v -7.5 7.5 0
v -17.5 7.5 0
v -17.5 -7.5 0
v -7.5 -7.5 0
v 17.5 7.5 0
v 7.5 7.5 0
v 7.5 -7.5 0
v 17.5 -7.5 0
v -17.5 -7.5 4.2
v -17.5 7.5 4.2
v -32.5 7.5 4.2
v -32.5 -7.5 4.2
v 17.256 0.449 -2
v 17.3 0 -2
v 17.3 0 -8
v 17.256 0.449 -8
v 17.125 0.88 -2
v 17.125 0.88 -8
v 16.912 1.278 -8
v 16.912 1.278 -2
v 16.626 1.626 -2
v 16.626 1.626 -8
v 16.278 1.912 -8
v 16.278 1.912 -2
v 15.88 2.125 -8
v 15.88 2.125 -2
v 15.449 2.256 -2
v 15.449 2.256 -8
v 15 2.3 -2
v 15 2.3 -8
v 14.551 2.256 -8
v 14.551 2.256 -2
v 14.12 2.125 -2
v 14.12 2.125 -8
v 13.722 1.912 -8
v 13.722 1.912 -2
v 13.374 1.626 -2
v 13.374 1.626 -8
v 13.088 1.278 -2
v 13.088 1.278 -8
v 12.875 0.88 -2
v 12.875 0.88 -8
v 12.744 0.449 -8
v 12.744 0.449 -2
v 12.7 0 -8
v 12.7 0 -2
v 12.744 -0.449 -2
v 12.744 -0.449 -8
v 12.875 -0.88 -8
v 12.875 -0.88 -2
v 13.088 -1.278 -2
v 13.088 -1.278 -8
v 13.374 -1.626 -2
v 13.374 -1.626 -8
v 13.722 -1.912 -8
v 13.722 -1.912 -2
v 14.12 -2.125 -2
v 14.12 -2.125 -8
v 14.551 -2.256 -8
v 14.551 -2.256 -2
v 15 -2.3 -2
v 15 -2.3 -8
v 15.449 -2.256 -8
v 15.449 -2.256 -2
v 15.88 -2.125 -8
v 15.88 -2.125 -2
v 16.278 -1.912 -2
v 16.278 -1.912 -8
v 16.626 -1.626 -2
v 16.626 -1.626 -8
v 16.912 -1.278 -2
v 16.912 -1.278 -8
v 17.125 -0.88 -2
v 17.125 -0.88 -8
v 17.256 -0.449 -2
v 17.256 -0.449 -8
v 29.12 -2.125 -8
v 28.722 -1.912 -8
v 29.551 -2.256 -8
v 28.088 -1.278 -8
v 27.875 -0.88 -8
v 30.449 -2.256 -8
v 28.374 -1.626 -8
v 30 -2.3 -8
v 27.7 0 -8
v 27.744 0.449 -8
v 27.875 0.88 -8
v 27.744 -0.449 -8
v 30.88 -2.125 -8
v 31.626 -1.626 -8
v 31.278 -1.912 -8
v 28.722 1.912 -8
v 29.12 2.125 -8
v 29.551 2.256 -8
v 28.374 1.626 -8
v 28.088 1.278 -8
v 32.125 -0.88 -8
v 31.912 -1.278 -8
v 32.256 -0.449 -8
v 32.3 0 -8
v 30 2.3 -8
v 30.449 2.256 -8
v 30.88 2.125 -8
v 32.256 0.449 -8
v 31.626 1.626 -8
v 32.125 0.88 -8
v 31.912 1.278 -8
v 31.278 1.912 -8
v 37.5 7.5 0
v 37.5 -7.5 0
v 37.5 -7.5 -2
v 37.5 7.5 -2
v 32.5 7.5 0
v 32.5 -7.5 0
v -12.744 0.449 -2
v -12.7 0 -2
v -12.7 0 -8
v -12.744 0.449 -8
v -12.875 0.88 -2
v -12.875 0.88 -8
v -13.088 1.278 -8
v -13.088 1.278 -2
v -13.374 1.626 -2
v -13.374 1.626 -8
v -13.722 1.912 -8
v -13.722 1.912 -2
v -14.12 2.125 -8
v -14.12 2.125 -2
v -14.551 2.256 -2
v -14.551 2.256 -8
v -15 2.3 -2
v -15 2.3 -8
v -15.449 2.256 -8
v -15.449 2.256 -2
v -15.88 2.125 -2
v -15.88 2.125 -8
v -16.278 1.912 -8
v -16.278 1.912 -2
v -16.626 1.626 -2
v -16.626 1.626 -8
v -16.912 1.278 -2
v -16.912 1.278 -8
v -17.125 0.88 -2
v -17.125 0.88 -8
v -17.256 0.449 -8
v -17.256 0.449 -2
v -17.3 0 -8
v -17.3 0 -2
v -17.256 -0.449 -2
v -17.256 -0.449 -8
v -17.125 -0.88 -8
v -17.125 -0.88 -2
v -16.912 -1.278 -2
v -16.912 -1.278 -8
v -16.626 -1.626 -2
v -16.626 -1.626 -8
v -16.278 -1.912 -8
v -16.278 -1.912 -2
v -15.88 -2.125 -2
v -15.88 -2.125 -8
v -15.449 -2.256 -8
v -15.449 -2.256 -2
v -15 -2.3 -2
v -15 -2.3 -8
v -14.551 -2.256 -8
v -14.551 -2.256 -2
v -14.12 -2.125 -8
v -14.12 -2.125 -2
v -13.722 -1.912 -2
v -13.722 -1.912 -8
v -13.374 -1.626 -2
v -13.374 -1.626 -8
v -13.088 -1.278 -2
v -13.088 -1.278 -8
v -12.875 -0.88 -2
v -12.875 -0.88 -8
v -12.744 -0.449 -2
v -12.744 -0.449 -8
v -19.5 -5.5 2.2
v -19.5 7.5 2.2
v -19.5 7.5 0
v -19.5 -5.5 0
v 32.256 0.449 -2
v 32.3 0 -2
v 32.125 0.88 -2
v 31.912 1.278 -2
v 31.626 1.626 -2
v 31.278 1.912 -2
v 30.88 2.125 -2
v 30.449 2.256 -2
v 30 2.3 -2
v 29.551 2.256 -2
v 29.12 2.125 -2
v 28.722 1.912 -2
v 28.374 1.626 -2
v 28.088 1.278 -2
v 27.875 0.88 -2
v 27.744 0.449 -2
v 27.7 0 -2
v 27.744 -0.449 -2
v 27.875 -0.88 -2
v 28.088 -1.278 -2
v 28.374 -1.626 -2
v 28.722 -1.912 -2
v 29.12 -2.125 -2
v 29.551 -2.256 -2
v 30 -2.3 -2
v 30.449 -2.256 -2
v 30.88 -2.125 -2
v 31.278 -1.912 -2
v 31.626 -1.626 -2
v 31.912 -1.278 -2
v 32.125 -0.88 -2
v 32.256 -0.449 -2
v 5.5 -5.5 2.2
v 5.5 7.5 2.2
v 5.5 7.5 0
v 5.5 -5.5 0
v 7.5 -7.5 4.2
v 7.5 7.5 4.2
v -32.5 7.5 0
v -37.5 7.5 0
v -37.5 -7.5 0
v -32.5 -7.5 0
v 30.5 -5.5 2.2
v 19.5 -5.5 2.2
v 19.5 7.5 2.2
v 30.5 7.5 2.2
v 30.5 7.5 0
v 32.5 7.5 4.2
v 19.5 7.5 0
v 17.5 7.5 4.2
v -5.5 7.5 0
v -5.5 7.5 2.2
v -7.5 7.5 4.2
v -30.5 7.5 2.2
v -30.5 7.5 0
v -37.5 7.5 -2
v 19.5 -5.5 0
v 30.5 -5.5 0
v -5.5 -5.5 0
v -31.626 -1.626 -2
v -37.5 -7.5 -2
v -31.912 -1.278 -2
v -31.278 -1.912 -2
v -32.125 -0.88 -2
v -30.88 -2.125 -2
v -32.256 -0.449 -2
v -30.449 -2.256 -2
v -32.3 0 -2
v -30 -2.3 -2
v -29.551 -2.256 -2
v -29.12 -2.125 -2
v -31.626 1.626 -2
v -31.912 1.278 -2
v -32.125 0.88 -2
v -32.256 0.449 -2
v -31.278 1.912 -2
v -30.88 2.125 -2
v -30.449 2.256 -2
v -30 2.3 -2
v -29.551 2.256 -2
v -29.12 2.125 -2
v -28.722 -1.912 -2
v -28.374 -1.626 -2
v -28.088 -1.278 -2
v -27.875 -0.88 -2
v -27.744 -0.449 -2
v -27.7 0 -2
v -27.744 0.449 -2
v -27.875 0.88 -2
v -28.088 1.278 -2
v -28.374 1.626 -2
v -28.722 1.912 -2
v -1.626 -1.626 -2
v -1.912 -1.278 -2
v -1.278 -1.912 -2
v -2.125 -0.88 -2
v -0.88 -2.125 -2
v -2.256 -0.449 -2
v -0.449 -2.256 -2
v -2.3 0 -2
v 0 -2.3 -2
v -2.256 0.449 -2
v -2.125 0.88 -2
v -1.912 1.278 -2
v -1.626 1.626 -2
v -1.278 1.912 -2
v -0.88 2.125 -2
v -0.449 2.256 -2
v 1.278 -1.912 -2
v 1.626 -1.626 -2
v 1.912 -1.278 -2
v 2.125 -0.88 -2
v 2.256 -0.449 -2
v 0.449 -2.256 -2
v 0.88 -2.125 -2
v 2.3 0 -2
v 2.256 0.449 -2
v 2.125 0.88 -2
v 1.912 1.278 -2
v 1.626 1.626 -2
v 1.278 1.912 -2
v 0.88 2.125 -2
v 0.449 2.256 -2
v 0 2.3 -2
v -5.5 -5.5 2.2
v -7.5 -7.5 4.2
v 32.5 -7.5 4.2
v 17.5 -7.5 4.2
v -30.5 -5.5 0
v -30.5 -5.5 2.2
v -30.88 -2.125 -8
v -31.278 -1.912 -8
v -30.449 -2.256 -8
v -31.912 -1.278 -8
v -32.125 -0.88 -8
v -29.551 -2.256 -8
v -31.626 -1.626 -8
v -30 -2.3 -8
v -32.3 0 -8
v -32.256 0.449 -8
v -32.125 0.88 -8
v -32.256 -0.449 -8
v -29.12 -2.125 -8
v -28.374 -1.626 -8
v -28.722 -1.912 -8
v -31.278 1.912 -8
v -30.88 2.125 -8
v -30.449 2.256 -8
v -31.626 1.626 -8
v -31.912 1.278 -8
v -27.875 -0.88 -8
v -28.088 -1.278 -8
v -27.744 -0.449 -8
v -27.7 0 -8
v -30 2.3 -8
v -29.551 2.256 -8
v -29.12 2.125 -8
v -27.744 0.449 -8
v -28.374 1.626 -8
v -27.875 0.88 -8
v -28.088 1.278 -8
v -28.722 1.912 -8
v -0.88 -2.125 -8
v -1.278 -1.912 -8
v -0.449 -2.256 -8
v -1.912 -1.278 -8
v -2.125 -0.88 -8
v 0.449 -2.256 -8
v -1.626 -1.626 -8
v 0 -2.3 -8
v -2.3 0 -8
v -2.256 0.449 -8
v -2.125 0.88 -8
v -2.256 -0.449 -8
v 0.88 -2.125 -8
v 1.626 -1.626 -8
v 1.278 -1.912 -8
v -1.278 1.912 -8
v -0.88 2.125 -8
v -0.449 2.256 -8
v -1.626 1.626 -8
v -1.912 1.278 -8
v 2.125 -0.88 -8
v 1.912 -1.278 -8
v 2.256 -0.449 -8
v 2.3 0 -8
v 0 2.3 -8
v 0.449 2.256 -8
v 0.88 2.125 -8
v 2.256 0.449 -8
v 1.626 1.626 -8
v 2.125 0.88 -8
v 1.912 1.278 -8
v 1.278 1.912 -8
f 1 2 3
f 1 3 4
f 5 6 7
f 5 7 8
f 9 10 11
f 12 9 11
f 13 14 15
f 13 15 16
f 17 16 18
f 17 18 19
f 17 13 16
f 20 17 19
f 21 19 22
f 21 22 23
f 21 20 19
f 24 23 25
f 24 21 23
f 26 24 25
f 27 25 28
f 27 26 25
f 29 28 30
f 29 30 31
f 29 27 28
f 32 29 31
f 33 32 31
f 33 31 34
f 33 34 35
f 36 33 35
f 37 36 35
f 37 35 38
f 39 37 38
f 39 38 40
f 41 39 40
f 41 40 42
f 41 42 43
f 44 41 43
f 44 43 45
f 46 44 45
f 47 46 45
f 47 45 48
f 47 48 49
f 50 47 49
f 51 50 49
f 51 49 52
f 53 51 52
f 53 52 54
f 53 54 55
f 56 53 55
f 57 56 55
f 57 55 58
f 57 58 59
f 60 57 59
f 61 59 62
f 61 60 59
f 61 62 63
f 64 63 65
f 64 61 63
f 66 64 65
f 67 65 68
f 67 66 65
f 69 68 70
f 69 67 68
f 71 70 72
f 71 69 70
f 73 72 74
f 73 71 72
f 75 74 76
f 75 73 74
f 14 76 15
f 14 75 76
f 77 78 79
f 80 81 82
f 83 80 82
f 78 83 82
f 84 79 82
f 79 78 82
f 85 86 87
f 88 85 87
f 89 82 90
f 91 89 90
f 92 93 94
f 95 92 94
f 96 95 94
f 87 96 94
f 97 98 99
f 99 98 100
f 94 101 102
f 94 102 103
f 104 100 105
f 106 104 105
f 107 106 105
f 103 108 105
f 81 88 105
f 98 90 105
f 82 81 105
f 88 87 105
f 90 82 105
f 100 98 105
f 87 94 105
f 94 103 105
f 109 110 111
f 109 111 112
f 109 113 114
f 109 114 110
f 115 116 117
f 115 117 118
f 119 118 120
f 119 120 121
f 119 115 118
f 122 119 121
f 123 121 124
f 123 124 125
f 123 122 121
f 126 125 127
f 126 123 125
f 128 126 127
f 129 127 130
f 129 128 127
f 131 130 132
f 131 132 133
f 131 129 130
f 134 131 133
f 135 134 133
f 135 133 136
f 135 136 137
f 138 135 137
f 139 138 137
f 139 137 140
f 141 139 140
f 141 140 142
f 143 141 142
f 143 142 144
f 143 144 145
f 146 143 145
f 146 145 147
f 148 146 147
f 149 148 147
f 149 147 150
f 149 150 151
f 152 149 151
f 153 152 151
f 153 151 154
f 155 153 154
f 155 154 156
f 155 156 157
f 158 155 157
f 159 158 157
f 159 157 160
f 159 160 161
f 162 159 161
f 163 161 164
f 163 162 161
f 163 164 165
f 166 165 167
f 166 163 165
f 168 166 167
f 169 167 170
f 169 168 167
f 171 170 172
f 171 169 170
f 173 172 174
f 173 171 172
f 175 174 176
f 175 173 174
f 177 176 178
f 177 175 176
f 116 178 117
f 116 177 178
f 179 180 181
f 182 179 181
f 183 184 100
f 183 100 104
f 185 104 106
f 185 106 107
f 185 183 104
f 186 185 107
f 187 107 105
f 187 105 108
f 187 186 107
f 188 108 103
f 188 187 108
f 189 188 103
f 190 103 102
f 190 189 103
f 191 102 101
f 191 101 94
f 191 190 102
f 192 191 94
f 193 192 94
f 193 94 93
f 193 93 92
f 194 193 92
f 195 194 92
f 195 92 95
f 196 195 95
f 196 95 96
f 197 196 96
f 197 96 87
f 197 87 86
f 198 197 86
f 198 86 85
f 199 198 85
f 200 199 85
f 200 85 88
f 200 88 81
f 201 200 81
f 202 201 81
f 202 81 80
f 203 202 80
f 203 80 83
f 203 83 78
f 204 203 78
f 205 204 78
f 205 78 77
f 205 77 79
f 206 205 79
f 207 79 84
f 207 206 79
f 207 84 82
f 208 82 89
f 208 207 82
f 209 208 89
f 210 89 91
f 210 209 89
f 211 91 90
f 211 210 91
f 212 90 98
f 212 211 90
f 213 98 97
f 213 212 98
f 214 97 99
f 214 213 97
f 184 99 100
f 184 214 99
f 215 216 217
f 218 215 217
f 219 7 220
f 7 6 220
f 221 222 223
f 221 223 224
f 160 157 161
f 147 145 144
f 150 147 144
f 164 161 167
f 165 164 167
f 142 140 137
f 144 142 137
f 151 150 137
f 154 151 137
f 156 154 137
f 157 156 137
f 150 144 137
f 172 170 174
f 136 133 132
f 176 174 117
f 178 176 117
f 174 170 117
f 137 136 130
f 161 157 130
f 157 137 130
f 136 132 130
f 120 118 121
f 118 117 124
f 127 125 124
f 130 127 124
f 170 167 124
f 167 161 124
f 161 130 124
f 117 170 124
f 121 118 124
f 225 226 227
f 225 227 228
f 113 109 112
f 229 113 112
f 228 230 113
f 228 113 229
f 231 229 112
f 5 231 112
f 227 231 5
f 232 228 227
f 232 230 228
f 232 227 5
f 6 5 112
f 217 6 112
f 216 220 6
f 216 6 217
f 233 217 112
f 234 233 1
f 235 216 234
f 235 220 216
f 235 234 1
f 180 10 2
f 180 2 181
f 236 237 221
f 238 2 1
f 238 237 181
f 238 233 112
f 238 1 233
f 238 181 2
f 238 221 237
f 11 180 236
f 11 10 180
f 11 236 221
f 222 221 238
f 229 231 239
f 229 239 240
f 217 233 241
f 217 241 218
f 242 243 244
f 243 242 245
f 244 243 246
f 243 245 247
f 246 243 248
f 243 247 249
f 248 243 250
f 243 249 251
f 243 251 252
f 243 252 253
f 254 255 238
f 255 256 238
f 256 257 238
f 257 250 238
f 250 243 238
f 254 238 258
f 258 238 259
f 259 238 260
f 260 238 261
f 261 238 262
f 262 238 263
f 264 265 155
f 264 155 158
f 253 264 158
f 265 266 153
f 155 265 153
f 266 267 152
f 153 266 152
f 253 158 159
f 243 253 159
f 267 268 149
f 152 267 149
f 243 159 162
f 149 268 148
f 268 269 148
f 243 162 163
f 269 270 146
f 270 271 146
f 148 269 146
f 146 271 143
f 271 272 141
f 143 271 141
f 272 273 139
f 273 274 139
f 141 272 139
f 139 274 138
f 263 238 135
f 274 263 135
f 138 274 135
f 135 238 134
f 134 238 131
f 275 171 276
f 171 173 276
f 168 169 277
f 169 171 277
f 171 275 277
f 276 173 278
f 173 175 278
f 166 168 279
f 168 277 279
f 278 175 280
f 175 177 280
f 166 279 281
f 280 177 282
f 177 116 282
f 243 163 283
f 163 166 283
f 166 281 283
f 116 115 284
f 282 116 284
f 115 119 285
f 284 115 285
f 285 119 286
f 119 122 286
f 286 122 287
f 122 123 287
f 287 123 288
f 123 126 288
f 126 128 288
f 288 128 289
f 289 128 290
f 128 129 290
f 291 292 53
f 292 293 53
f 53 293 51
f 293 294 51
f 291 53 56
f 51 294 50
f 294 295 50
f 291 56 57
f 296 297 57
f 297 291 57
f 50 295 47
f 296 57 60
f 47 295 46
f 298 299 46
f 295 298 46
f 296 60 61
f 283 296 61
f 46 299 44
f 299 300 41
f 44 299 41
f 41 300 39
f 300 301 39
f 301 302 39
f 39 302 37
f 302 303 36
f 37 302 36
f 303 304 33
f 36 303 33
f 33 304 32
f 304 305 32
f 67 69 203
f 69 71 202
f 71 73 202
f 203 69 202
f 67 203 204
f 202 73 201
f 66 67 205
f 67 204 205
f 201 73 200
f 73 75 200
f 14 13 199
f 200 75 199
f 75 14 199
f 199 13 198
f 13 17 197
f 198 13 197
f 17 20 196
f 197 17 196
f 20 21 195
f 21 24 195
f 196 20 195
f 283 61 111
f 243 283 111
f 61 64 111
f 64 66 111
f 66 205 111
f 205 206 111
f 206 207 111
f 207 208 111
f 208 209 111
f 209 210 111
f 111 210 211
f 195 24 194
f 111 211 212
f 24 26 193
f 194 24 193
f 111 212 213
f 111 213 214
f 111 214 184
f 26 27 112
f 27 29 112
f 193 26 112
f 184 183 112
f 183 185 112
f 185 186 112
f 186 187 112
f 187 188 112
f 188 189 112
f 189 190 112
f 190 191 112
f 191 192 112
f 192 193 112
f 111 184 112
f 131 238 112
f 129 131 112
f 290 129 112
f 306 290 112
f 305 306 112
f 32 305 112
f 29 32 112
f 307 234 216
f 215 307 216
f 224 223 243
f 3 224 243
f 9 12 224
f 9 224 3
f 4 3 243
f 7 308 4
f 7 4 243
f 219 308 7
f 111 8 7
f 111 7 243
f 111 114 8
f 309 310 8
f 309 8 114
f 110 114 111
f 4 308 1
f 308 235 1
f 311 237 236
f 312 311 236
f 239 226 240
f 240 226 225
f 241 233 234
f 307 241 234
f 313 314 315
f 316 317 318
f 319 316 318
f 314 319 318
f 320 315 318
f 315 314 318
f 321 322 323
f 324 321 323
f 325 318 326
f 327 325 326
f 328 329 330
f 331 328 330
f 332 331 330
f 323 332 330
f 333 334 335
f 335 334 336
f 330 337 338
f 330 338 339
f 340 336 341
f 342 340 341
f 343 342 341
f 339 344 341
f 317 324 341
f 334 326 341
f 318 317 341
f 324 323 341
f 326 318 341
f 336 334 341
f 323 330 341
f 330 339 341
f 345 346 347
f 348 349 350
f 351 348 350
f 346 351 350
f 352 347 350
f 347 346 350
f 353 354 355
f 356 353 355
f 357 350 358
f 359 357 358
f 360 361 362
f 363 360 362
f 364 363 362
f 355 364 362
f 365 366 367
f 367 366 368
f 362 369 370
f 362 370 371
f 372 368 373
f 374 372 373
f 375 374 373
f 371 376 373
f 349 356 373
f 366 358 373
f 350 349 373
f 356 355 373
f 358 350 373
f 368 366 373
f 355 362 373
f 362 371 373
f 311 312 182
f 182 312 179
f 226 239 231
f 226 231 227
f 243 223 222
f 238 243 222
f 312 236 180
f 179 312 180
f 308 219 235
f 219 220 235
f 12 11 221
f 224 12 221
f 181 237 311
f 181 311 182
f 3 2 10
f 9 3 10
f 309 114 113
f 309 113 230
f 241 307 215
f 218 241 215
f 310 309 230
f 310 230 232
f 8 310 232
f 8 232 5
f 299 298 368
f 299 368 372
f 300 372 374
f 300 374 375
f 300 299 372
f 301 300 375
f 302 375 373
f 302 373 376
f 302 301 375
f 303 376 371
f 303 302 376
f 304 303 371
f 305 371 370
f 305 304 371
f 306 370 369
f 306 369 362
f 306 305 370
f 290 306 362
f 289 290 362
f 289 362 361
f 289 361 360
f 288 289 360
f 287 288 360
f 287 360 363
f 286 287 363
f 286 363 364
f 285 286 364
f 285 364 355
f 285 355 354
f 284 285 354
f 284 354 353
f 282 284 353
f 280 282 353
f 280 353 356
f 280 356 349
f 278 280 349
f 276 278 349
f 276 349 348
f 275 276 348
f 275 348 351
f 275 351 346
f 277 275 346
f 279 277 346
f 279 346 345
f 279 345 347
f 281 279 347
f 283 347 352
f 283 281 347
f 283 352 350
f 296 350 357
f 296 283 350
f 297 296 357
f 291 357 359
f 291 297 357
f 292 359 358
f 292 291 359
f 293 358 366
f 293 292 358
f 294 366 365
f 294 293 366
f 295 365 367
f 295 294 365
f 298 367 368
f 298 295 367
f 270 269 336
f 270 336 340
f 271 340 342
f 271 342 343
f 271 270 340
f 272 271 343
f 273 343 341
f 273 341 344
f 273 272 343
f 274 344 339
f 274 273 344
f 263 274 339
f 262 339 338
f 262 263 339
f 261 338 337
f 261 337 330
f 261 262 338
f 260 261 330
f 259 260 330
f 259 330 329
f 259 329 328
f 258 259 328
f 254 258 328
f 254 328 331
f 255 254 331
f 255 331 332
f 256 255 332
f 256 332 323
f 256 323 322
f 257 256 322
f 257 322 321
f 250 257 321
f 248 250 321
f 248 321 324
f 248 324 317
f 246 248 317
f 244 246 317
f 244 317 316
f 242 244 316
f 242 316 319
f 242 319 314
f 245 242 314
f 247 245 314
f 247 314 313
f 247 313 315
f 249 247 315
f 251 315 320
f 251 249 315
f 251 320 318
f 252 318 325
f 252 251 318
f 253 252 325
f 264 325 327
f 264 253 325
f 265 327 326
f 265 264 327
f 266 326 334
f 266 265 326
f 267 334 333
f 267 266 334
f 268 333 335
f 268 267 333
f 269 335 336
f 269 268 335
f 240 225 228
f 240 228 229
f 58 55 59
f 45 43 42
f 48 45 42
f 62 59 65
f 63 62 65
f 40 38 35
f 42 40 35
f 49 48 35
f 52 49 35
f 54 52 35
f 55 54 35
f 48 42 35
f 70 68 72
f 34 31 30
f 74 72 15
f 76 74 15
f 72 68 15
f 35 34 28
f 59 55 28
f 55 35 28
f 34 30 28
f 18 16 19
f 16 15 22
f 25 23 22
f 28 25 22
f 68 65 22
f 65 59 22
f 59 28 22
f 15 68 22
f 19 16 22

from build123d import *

# Parameters (mm, degrees)
F0_W     = 15
F0_H     = 15
F0_R     = 2.3
F1_DEPTH = 2
F2_DEPTH = 8
F4_DEPTH = 7.5
F5_START = 5.5
F3_W     = 11
F3_H     = 2.2
F5_DEPTH = 2


# Not quite as in the source:
# - a feature names something its author has since deleted; it is built from what else it names


with BuildPart() as f1:
    # F0 (on Top) → F1 (new body)
    with BuildSketch(Plane.XY):
        with Locations((-30, 0)):
            Rectangle(F0_W, F0_H)
        with Locations((-30, 0)):
            Circle(F0_R, mode=Mode.SUBTRACT)
        with Locations((-15, 0)):
            Rectangle(F0_W, F0_H)
        with Locations((-15, 0)):
            Circle(F0_R, mode=Mode.SUBTRACT)
        Rectangle(F0_W, F0_H)
        Circle(F0_R, mode=Mode.SUBTRACT)
        with Locations((15, 0)):
            Rectangle(F0_W, F0_H)
        with Locations((15, 0)):
            Circle(F0_R, mode=Mode.SUBTRACT)
        with Locations((30, 0)):
            Rectangle(F0_W, F0_H)
        with Locations((30, 0)):
            Circle(F0_R, mode=Mode.SUBTRACT)
    extrude(amount=-F1_DEPTH)

    # F0 (on Top) → F2 (join)
    with BuildSketch(Plane.XY):
        with Locations((-15, 0)):
            Circle(F0_R)
        with Locations((-30, 0)):
            Circle(F0_R)
        Circle(F0_R)
        with Locations((15, 0)):
            Circle(F0_R)
        with Locations((30, 0)):
            Circle(F0_R)
    extrude(amount=-F2_DEPTH)

    # F3 (on Front) → F4 (join, symmetric)
    with BuildSketch(Plane.XZ):
        Polygon((-32.5, 4.2), (-32.5, 0), (-30.5, 0), (-30.5, 2.2), (-19.5, 2.2), (-19.5, 0), (-17.5, 0), (-17.5, 4.2), align=None)
        Polygon((5.5, 2.2), (5.5, 0), (7.5, 0), (7.5, 4.2), (-7.5, 4.2), (-7.5, 0), (-5.5, 0), (-5.5, 2.2), align=None)
        Polygon((30.5, 2.2), (30.5, 0), (32.5, 0), (32.5, 4.2), (17.5, 4.2), (17.5, 0), (19.5, 0), (19.5, 2.2), align=None)
    extrude(amount=F4_DEPTH, both=True)

    # F3 (on Front) → F5 (join)
    with BuildSketch(Plane.XZ.offset(F5_START)):
        with Locations((-25, 1.1)):
            Rectangle(F3_W, F3_H)
        with Locations((0, 1.1)):
            Rectangle(F3_W, F3_H)
        with Locations((25, 1.1)):
            Rectangle(F3_W, F3_H)
    extrude(amount=F5_DEPTH)


solid = f1.part
